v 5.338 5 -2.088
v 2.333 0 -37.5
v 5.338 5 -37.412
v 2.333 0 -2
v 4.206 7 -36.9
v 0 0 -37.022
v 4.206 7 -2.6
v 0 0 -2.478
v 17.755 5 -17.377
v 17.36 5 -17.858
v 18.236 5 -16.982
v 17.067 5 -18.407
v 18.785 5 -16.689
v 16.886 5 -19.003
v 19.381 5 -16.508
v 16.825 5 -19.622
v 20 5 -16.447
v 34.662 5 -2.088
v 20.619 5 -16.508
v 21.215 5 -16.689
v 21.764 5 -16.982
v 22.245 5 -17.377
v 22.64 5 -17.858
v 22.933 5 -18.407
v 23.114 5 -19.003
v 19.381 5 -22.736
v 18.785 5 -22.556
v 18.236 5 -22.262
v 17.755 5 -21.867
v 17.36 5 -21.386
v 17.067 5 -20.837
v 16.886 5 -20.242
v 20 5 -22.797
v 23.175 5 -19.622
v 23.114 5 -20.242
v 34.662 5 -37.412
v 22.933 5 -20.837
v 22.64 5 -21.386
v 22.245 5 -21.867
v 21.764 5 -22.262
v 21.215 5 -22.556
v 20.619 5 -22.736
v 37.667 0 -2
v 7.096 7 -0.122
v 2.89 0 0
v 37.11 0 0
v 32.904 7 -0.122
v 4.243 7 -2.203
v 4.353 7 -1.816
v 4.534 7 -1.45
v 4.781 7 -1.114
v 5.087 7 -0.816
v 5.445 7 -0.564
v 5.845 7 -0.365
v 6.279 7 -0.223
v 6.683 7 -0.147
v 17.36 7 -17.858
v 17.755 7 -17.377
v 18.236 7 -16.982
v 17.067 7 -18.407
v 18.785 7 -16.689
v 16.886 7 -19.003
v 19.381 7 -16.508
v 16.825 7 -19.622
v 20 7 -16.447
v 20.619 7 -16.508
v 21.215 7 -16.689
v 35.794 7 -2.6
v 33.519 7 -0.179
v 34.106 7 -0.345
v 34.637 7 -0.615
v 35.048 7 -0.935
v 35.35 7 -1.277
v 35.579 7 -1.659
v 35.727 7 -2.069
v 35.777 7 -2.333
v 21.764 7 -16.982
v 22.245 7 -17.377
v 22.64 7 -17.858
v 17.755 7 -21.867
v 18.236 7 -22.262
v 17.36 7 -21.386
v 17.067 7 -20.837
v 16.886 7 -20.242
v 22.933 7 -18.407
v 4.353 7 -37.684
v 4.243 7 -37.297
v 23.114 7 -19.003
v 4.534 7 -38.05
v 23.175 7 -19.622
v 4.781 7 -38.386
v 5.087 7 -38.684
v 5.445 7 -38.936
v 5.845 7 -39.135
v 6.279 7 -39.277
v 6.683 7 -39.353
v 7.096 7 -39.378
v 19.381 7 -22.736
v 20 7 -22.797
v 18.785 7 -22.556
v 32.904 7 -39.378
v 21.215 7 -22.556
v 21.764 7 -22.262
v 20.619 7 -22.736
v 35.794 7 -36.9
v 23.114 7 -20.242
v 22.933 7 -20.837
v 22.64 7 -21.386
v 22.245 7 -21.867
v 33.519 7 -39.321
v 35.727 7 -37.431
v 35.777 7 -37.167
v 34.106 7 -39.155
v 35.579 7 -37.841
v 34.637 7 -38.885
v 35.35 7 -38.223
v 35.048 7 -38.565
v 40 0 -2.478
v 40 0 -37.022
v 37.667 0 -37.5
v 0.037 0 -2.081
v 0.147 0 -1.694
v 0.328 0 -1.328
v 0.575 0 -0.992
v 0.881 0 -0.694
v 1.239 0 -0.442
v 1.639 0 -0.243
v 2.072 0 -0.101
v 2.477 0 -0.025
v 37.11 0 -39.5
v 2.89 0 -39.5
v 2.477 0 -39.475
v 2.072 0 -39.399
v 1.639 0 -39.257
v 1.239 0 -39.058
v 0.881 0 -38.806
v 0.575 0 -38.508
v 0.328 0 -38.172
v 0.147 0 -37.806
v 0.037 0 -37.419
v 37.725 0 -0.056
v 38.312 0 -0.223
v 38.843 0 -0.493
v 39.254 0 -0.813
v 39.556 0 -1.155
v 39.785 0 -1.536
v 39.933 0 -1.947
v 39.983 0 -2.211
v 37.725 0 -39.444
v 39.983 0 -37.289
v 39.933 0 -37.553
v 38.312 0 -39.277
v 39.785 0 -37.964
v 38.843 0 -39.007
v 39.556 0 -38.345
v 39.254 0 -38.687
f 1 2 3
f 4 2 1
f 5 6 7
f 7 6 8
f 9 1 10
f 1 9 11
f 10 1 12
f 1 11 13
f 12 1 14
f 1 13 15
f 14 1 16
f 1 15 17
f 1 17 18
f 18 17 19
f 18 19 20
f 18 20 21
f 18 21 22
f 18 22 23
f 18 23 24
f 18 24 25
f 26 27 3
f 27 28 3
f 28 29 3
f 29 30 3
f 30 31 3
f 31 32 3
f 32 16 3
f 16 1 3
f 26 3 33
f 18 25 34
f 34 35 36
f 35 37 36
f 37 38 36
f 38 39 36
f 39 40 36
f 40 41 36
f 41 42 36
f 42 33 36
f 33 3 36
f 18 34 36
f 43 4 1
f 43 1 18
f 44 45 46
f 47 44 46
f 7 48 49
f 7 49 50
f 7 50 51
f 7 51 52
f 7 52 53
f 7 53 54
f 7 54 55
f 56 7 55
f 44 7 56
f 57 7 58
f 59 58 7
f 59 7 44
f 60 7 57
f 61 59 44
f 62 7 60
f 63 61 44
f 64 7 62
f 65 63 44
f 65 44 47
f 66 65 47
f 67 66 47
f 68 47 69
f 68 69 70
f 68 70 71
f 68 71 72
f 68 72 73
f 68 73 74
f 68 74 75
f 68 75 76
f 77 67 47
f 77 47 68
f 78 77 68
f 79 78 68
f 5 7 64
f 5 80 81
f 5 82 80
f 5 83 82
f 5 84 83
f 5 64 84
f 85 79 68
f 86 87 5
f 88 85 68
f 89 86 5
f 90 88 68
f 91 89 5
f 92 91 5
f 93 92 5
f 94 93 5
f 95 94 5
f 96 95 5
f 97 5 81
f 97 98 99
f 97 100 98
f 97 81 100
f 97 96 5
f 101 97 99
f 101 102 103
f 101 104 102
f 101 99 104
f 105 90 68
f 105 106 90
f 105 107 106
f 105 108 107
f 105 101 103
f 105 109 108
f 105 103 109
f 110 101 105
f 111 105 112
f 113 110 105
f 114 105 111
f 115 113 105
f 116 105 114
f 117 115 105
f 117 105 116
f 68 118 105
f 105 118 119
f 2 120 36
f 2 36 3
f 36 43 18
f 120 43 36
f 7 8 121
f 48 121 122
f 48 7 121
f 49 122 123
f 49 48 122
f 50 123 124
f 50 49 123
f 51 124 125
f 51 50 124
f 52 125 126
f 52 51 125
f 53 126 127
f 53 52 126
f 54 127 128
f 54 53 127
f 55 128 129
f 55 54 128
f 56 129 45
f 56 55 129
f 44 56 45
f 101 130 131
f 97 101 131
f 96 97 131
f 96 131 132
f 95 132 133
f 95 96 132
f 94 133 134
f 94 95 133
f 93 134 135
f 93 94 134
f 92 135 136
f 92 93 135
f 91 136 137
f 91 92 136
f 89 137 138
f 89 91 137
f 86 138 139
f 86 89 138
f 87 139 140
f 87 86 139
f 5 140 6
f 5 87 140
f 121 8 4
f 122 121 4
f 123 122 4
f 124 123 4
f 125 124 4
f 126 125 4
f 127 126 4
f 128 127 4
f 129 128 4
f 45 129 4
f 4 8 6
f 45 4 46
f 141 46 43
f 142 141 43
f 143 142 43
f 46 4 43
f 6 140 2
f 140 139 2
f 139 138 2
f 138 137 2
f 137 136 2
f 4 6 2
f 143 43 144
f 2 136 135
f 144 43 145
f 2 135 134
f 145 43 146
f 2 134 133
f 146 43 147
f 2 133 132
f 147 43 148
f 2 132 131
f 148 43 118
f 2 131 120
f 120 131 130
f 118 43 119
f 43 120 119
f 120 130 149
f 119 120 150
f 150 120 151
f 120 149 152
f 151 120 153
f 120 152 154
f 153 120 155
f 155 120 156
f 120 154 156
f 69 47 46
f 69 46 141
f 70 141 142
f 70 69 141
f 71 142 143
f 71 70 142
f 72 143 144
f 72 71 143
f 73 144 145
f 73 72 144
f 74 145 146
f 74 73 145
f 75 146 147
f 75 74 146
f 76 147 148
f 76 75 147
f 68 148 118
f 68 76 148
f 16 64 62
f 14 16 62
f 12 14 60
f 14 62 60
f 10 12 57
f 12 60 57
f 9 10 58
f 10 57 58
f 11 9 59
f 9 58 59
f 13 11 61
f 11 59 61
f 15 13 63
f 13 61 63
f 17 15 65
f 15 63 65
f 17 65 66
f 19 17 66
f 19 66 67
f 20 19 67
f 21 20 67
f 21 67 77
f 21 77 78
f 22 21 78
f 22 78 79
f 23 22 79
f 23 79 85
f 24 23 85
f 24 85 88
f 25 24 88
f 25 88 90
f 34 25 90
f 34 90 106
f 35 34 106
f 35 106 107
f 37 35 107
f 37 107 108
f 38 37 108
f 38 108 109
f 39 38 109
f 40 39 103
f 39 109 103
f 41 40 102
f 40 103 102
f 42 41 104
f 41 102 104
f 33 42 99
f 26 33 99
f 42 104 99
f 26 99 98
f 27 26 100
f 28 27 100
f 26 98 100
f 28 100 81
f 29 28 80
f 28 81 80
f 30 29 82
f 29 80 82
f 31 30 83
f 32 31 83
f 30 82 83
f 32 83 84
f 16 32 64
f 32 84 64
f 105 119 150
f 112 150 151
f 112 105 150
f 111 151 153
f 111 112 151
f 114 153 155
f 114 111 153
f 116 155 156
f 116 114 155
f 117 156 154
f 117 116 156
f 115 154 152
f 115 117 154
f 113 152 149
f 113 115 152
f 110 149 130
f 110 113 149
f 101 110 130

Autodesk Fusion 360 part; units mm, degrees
sketch "bottom" plane through (0, 0, 0) normal (0, 1, 0) x (1, 0, 0)
  line L0 (0, 0) -> (40, 0)
  line L1 (40, 0) -> (40, 39.5)
  line L2 (40, 39.5) -> (0, 39.5)
  line L3 (0, 39.5) -> (0, 0)
  dimension "d4" = 40
  dimension "d5" = 39.5
extrude "Extrude1" add sketch "bottom" along normal blind 7
draft "Draft1" angle 1 neutral plane through (0, 0, 0) pull (0, 1, 0) 1 faces at (13.3333, 2.3333, 0)
draft "Draft2" angle 31 neutral plane through (0, 0, 0) pull (0, 1, 0) 2 faces at (0, 2.3333, -13.2074) (40, 2.3333, -13.2074)
draft "Draft3" angle 1 neutral plane through (0, 0, 0) pull (0, 1, 0) 1 faces at (14.7353, 2.3333, -39.5)
shell "Shell1" thickness 2 removed faces 1 at (26.6667, 0, -13.1667)
sketch "top" plane through (0, 7, 0) normal (0, 1, 0) x (-1, 0, 0)
  line L0 (-4.206, -39.3778) -> (-4.206, -0.1222)
  line L1 (-4.206, -0.1222) -> (-35.794, -0.1222)
  line L2 (-35.794, -0.1222) -> (-35.794, -39.3778)
  line L3 (-35.794, -39.3778) -> (-4.206, -39.3778)
  line L4 (-20, -0.1222) -> (-20, -19.6222) construction
  circle A0 centre (-20, -19.6222) radius 3.175
  dimension "d23" = 19.5
  dimension "d25" = 6.35
extrude "Extrude2" cut sketch "top" against normal blind 2 contours A0
fillet "Fillet1" radius 2.5 4 edges at (2.103, 3.5, -0.0611) (37.897, 3.5, -0.0611) (37.897, 3.5, -39.4389) (2.103, 3.5, -39.4389)
sketch "Sketch3" plane through (0, 0, 0) normal (0, 0.0175, 0.9998) x (1, 0, 0)
  line L0 (37.1096, 0) -> (32.9036, 7.0011)
  line L1 (32.9036, 7.0011) -> (7.0964, 7.0011)
  line L2 (7.0964, 7.0011) -> (2.8904, 0)
  line L3 (2.8904, 0) -> (37.1096, 0)
  line L4 (20, 7.0011) -> (20, 0) construction
  line L5 (4.9934, 3.5005) -> (35.0066, 3.5005) construction
  line L6 (4.9934, 1.7505) -> (35.0066, 1.7505) construction
  dimension "d31" = 1.75
  dimension "d32" = 3.5
extrude "Extrude3" [suppressed]
equation "PLATE_BASE_WIDTH = 40 mm"
equation "PLATE_BASE_HEIGHT = 39.5 mm"
equation "PLATE_HEIGHT = 7 mm"
equation "d4 = PLATE_BASE_WIDTH"
equation "d5 = PLATE_BASE_HEIGHT"
equation "d6 = PLATE_HEIGHT"
equation "DRAFT_SIDES = 31 deg"
equation "DRAFT_BACK = 1 deg"
equation "DRAFT_FRONT = 1 deg"
equation "d14 = DRAFT_FRONT"
equation "d16 = DRAFT_SIDES"
equation "d17 = DRAFT_SIDES"
equation "d18 = DRAFT_BACK"
equation "SHELL_THICKNESS = 2 mm"
equation "d21 = SHELL_THICKNESS"
equation "THREAD_OFFSET_FRONT = 20 mm"
equation "d23 = PLATE_BASE_HEIGHT - THREAD_OFFSET_FRONT"
equation "THREAD_HOLE_RAD = 0.25 in"
equation "d25 = THREAD_HOLE_RAD"
equation "EDGE_FILLET = 2.5 mm"
equation "d30 = EDGE_FILLET"
equation "d31 = PLATE_HEIGHT / 4"
equation "d32 = PLATE_HEIGHT / 2"
